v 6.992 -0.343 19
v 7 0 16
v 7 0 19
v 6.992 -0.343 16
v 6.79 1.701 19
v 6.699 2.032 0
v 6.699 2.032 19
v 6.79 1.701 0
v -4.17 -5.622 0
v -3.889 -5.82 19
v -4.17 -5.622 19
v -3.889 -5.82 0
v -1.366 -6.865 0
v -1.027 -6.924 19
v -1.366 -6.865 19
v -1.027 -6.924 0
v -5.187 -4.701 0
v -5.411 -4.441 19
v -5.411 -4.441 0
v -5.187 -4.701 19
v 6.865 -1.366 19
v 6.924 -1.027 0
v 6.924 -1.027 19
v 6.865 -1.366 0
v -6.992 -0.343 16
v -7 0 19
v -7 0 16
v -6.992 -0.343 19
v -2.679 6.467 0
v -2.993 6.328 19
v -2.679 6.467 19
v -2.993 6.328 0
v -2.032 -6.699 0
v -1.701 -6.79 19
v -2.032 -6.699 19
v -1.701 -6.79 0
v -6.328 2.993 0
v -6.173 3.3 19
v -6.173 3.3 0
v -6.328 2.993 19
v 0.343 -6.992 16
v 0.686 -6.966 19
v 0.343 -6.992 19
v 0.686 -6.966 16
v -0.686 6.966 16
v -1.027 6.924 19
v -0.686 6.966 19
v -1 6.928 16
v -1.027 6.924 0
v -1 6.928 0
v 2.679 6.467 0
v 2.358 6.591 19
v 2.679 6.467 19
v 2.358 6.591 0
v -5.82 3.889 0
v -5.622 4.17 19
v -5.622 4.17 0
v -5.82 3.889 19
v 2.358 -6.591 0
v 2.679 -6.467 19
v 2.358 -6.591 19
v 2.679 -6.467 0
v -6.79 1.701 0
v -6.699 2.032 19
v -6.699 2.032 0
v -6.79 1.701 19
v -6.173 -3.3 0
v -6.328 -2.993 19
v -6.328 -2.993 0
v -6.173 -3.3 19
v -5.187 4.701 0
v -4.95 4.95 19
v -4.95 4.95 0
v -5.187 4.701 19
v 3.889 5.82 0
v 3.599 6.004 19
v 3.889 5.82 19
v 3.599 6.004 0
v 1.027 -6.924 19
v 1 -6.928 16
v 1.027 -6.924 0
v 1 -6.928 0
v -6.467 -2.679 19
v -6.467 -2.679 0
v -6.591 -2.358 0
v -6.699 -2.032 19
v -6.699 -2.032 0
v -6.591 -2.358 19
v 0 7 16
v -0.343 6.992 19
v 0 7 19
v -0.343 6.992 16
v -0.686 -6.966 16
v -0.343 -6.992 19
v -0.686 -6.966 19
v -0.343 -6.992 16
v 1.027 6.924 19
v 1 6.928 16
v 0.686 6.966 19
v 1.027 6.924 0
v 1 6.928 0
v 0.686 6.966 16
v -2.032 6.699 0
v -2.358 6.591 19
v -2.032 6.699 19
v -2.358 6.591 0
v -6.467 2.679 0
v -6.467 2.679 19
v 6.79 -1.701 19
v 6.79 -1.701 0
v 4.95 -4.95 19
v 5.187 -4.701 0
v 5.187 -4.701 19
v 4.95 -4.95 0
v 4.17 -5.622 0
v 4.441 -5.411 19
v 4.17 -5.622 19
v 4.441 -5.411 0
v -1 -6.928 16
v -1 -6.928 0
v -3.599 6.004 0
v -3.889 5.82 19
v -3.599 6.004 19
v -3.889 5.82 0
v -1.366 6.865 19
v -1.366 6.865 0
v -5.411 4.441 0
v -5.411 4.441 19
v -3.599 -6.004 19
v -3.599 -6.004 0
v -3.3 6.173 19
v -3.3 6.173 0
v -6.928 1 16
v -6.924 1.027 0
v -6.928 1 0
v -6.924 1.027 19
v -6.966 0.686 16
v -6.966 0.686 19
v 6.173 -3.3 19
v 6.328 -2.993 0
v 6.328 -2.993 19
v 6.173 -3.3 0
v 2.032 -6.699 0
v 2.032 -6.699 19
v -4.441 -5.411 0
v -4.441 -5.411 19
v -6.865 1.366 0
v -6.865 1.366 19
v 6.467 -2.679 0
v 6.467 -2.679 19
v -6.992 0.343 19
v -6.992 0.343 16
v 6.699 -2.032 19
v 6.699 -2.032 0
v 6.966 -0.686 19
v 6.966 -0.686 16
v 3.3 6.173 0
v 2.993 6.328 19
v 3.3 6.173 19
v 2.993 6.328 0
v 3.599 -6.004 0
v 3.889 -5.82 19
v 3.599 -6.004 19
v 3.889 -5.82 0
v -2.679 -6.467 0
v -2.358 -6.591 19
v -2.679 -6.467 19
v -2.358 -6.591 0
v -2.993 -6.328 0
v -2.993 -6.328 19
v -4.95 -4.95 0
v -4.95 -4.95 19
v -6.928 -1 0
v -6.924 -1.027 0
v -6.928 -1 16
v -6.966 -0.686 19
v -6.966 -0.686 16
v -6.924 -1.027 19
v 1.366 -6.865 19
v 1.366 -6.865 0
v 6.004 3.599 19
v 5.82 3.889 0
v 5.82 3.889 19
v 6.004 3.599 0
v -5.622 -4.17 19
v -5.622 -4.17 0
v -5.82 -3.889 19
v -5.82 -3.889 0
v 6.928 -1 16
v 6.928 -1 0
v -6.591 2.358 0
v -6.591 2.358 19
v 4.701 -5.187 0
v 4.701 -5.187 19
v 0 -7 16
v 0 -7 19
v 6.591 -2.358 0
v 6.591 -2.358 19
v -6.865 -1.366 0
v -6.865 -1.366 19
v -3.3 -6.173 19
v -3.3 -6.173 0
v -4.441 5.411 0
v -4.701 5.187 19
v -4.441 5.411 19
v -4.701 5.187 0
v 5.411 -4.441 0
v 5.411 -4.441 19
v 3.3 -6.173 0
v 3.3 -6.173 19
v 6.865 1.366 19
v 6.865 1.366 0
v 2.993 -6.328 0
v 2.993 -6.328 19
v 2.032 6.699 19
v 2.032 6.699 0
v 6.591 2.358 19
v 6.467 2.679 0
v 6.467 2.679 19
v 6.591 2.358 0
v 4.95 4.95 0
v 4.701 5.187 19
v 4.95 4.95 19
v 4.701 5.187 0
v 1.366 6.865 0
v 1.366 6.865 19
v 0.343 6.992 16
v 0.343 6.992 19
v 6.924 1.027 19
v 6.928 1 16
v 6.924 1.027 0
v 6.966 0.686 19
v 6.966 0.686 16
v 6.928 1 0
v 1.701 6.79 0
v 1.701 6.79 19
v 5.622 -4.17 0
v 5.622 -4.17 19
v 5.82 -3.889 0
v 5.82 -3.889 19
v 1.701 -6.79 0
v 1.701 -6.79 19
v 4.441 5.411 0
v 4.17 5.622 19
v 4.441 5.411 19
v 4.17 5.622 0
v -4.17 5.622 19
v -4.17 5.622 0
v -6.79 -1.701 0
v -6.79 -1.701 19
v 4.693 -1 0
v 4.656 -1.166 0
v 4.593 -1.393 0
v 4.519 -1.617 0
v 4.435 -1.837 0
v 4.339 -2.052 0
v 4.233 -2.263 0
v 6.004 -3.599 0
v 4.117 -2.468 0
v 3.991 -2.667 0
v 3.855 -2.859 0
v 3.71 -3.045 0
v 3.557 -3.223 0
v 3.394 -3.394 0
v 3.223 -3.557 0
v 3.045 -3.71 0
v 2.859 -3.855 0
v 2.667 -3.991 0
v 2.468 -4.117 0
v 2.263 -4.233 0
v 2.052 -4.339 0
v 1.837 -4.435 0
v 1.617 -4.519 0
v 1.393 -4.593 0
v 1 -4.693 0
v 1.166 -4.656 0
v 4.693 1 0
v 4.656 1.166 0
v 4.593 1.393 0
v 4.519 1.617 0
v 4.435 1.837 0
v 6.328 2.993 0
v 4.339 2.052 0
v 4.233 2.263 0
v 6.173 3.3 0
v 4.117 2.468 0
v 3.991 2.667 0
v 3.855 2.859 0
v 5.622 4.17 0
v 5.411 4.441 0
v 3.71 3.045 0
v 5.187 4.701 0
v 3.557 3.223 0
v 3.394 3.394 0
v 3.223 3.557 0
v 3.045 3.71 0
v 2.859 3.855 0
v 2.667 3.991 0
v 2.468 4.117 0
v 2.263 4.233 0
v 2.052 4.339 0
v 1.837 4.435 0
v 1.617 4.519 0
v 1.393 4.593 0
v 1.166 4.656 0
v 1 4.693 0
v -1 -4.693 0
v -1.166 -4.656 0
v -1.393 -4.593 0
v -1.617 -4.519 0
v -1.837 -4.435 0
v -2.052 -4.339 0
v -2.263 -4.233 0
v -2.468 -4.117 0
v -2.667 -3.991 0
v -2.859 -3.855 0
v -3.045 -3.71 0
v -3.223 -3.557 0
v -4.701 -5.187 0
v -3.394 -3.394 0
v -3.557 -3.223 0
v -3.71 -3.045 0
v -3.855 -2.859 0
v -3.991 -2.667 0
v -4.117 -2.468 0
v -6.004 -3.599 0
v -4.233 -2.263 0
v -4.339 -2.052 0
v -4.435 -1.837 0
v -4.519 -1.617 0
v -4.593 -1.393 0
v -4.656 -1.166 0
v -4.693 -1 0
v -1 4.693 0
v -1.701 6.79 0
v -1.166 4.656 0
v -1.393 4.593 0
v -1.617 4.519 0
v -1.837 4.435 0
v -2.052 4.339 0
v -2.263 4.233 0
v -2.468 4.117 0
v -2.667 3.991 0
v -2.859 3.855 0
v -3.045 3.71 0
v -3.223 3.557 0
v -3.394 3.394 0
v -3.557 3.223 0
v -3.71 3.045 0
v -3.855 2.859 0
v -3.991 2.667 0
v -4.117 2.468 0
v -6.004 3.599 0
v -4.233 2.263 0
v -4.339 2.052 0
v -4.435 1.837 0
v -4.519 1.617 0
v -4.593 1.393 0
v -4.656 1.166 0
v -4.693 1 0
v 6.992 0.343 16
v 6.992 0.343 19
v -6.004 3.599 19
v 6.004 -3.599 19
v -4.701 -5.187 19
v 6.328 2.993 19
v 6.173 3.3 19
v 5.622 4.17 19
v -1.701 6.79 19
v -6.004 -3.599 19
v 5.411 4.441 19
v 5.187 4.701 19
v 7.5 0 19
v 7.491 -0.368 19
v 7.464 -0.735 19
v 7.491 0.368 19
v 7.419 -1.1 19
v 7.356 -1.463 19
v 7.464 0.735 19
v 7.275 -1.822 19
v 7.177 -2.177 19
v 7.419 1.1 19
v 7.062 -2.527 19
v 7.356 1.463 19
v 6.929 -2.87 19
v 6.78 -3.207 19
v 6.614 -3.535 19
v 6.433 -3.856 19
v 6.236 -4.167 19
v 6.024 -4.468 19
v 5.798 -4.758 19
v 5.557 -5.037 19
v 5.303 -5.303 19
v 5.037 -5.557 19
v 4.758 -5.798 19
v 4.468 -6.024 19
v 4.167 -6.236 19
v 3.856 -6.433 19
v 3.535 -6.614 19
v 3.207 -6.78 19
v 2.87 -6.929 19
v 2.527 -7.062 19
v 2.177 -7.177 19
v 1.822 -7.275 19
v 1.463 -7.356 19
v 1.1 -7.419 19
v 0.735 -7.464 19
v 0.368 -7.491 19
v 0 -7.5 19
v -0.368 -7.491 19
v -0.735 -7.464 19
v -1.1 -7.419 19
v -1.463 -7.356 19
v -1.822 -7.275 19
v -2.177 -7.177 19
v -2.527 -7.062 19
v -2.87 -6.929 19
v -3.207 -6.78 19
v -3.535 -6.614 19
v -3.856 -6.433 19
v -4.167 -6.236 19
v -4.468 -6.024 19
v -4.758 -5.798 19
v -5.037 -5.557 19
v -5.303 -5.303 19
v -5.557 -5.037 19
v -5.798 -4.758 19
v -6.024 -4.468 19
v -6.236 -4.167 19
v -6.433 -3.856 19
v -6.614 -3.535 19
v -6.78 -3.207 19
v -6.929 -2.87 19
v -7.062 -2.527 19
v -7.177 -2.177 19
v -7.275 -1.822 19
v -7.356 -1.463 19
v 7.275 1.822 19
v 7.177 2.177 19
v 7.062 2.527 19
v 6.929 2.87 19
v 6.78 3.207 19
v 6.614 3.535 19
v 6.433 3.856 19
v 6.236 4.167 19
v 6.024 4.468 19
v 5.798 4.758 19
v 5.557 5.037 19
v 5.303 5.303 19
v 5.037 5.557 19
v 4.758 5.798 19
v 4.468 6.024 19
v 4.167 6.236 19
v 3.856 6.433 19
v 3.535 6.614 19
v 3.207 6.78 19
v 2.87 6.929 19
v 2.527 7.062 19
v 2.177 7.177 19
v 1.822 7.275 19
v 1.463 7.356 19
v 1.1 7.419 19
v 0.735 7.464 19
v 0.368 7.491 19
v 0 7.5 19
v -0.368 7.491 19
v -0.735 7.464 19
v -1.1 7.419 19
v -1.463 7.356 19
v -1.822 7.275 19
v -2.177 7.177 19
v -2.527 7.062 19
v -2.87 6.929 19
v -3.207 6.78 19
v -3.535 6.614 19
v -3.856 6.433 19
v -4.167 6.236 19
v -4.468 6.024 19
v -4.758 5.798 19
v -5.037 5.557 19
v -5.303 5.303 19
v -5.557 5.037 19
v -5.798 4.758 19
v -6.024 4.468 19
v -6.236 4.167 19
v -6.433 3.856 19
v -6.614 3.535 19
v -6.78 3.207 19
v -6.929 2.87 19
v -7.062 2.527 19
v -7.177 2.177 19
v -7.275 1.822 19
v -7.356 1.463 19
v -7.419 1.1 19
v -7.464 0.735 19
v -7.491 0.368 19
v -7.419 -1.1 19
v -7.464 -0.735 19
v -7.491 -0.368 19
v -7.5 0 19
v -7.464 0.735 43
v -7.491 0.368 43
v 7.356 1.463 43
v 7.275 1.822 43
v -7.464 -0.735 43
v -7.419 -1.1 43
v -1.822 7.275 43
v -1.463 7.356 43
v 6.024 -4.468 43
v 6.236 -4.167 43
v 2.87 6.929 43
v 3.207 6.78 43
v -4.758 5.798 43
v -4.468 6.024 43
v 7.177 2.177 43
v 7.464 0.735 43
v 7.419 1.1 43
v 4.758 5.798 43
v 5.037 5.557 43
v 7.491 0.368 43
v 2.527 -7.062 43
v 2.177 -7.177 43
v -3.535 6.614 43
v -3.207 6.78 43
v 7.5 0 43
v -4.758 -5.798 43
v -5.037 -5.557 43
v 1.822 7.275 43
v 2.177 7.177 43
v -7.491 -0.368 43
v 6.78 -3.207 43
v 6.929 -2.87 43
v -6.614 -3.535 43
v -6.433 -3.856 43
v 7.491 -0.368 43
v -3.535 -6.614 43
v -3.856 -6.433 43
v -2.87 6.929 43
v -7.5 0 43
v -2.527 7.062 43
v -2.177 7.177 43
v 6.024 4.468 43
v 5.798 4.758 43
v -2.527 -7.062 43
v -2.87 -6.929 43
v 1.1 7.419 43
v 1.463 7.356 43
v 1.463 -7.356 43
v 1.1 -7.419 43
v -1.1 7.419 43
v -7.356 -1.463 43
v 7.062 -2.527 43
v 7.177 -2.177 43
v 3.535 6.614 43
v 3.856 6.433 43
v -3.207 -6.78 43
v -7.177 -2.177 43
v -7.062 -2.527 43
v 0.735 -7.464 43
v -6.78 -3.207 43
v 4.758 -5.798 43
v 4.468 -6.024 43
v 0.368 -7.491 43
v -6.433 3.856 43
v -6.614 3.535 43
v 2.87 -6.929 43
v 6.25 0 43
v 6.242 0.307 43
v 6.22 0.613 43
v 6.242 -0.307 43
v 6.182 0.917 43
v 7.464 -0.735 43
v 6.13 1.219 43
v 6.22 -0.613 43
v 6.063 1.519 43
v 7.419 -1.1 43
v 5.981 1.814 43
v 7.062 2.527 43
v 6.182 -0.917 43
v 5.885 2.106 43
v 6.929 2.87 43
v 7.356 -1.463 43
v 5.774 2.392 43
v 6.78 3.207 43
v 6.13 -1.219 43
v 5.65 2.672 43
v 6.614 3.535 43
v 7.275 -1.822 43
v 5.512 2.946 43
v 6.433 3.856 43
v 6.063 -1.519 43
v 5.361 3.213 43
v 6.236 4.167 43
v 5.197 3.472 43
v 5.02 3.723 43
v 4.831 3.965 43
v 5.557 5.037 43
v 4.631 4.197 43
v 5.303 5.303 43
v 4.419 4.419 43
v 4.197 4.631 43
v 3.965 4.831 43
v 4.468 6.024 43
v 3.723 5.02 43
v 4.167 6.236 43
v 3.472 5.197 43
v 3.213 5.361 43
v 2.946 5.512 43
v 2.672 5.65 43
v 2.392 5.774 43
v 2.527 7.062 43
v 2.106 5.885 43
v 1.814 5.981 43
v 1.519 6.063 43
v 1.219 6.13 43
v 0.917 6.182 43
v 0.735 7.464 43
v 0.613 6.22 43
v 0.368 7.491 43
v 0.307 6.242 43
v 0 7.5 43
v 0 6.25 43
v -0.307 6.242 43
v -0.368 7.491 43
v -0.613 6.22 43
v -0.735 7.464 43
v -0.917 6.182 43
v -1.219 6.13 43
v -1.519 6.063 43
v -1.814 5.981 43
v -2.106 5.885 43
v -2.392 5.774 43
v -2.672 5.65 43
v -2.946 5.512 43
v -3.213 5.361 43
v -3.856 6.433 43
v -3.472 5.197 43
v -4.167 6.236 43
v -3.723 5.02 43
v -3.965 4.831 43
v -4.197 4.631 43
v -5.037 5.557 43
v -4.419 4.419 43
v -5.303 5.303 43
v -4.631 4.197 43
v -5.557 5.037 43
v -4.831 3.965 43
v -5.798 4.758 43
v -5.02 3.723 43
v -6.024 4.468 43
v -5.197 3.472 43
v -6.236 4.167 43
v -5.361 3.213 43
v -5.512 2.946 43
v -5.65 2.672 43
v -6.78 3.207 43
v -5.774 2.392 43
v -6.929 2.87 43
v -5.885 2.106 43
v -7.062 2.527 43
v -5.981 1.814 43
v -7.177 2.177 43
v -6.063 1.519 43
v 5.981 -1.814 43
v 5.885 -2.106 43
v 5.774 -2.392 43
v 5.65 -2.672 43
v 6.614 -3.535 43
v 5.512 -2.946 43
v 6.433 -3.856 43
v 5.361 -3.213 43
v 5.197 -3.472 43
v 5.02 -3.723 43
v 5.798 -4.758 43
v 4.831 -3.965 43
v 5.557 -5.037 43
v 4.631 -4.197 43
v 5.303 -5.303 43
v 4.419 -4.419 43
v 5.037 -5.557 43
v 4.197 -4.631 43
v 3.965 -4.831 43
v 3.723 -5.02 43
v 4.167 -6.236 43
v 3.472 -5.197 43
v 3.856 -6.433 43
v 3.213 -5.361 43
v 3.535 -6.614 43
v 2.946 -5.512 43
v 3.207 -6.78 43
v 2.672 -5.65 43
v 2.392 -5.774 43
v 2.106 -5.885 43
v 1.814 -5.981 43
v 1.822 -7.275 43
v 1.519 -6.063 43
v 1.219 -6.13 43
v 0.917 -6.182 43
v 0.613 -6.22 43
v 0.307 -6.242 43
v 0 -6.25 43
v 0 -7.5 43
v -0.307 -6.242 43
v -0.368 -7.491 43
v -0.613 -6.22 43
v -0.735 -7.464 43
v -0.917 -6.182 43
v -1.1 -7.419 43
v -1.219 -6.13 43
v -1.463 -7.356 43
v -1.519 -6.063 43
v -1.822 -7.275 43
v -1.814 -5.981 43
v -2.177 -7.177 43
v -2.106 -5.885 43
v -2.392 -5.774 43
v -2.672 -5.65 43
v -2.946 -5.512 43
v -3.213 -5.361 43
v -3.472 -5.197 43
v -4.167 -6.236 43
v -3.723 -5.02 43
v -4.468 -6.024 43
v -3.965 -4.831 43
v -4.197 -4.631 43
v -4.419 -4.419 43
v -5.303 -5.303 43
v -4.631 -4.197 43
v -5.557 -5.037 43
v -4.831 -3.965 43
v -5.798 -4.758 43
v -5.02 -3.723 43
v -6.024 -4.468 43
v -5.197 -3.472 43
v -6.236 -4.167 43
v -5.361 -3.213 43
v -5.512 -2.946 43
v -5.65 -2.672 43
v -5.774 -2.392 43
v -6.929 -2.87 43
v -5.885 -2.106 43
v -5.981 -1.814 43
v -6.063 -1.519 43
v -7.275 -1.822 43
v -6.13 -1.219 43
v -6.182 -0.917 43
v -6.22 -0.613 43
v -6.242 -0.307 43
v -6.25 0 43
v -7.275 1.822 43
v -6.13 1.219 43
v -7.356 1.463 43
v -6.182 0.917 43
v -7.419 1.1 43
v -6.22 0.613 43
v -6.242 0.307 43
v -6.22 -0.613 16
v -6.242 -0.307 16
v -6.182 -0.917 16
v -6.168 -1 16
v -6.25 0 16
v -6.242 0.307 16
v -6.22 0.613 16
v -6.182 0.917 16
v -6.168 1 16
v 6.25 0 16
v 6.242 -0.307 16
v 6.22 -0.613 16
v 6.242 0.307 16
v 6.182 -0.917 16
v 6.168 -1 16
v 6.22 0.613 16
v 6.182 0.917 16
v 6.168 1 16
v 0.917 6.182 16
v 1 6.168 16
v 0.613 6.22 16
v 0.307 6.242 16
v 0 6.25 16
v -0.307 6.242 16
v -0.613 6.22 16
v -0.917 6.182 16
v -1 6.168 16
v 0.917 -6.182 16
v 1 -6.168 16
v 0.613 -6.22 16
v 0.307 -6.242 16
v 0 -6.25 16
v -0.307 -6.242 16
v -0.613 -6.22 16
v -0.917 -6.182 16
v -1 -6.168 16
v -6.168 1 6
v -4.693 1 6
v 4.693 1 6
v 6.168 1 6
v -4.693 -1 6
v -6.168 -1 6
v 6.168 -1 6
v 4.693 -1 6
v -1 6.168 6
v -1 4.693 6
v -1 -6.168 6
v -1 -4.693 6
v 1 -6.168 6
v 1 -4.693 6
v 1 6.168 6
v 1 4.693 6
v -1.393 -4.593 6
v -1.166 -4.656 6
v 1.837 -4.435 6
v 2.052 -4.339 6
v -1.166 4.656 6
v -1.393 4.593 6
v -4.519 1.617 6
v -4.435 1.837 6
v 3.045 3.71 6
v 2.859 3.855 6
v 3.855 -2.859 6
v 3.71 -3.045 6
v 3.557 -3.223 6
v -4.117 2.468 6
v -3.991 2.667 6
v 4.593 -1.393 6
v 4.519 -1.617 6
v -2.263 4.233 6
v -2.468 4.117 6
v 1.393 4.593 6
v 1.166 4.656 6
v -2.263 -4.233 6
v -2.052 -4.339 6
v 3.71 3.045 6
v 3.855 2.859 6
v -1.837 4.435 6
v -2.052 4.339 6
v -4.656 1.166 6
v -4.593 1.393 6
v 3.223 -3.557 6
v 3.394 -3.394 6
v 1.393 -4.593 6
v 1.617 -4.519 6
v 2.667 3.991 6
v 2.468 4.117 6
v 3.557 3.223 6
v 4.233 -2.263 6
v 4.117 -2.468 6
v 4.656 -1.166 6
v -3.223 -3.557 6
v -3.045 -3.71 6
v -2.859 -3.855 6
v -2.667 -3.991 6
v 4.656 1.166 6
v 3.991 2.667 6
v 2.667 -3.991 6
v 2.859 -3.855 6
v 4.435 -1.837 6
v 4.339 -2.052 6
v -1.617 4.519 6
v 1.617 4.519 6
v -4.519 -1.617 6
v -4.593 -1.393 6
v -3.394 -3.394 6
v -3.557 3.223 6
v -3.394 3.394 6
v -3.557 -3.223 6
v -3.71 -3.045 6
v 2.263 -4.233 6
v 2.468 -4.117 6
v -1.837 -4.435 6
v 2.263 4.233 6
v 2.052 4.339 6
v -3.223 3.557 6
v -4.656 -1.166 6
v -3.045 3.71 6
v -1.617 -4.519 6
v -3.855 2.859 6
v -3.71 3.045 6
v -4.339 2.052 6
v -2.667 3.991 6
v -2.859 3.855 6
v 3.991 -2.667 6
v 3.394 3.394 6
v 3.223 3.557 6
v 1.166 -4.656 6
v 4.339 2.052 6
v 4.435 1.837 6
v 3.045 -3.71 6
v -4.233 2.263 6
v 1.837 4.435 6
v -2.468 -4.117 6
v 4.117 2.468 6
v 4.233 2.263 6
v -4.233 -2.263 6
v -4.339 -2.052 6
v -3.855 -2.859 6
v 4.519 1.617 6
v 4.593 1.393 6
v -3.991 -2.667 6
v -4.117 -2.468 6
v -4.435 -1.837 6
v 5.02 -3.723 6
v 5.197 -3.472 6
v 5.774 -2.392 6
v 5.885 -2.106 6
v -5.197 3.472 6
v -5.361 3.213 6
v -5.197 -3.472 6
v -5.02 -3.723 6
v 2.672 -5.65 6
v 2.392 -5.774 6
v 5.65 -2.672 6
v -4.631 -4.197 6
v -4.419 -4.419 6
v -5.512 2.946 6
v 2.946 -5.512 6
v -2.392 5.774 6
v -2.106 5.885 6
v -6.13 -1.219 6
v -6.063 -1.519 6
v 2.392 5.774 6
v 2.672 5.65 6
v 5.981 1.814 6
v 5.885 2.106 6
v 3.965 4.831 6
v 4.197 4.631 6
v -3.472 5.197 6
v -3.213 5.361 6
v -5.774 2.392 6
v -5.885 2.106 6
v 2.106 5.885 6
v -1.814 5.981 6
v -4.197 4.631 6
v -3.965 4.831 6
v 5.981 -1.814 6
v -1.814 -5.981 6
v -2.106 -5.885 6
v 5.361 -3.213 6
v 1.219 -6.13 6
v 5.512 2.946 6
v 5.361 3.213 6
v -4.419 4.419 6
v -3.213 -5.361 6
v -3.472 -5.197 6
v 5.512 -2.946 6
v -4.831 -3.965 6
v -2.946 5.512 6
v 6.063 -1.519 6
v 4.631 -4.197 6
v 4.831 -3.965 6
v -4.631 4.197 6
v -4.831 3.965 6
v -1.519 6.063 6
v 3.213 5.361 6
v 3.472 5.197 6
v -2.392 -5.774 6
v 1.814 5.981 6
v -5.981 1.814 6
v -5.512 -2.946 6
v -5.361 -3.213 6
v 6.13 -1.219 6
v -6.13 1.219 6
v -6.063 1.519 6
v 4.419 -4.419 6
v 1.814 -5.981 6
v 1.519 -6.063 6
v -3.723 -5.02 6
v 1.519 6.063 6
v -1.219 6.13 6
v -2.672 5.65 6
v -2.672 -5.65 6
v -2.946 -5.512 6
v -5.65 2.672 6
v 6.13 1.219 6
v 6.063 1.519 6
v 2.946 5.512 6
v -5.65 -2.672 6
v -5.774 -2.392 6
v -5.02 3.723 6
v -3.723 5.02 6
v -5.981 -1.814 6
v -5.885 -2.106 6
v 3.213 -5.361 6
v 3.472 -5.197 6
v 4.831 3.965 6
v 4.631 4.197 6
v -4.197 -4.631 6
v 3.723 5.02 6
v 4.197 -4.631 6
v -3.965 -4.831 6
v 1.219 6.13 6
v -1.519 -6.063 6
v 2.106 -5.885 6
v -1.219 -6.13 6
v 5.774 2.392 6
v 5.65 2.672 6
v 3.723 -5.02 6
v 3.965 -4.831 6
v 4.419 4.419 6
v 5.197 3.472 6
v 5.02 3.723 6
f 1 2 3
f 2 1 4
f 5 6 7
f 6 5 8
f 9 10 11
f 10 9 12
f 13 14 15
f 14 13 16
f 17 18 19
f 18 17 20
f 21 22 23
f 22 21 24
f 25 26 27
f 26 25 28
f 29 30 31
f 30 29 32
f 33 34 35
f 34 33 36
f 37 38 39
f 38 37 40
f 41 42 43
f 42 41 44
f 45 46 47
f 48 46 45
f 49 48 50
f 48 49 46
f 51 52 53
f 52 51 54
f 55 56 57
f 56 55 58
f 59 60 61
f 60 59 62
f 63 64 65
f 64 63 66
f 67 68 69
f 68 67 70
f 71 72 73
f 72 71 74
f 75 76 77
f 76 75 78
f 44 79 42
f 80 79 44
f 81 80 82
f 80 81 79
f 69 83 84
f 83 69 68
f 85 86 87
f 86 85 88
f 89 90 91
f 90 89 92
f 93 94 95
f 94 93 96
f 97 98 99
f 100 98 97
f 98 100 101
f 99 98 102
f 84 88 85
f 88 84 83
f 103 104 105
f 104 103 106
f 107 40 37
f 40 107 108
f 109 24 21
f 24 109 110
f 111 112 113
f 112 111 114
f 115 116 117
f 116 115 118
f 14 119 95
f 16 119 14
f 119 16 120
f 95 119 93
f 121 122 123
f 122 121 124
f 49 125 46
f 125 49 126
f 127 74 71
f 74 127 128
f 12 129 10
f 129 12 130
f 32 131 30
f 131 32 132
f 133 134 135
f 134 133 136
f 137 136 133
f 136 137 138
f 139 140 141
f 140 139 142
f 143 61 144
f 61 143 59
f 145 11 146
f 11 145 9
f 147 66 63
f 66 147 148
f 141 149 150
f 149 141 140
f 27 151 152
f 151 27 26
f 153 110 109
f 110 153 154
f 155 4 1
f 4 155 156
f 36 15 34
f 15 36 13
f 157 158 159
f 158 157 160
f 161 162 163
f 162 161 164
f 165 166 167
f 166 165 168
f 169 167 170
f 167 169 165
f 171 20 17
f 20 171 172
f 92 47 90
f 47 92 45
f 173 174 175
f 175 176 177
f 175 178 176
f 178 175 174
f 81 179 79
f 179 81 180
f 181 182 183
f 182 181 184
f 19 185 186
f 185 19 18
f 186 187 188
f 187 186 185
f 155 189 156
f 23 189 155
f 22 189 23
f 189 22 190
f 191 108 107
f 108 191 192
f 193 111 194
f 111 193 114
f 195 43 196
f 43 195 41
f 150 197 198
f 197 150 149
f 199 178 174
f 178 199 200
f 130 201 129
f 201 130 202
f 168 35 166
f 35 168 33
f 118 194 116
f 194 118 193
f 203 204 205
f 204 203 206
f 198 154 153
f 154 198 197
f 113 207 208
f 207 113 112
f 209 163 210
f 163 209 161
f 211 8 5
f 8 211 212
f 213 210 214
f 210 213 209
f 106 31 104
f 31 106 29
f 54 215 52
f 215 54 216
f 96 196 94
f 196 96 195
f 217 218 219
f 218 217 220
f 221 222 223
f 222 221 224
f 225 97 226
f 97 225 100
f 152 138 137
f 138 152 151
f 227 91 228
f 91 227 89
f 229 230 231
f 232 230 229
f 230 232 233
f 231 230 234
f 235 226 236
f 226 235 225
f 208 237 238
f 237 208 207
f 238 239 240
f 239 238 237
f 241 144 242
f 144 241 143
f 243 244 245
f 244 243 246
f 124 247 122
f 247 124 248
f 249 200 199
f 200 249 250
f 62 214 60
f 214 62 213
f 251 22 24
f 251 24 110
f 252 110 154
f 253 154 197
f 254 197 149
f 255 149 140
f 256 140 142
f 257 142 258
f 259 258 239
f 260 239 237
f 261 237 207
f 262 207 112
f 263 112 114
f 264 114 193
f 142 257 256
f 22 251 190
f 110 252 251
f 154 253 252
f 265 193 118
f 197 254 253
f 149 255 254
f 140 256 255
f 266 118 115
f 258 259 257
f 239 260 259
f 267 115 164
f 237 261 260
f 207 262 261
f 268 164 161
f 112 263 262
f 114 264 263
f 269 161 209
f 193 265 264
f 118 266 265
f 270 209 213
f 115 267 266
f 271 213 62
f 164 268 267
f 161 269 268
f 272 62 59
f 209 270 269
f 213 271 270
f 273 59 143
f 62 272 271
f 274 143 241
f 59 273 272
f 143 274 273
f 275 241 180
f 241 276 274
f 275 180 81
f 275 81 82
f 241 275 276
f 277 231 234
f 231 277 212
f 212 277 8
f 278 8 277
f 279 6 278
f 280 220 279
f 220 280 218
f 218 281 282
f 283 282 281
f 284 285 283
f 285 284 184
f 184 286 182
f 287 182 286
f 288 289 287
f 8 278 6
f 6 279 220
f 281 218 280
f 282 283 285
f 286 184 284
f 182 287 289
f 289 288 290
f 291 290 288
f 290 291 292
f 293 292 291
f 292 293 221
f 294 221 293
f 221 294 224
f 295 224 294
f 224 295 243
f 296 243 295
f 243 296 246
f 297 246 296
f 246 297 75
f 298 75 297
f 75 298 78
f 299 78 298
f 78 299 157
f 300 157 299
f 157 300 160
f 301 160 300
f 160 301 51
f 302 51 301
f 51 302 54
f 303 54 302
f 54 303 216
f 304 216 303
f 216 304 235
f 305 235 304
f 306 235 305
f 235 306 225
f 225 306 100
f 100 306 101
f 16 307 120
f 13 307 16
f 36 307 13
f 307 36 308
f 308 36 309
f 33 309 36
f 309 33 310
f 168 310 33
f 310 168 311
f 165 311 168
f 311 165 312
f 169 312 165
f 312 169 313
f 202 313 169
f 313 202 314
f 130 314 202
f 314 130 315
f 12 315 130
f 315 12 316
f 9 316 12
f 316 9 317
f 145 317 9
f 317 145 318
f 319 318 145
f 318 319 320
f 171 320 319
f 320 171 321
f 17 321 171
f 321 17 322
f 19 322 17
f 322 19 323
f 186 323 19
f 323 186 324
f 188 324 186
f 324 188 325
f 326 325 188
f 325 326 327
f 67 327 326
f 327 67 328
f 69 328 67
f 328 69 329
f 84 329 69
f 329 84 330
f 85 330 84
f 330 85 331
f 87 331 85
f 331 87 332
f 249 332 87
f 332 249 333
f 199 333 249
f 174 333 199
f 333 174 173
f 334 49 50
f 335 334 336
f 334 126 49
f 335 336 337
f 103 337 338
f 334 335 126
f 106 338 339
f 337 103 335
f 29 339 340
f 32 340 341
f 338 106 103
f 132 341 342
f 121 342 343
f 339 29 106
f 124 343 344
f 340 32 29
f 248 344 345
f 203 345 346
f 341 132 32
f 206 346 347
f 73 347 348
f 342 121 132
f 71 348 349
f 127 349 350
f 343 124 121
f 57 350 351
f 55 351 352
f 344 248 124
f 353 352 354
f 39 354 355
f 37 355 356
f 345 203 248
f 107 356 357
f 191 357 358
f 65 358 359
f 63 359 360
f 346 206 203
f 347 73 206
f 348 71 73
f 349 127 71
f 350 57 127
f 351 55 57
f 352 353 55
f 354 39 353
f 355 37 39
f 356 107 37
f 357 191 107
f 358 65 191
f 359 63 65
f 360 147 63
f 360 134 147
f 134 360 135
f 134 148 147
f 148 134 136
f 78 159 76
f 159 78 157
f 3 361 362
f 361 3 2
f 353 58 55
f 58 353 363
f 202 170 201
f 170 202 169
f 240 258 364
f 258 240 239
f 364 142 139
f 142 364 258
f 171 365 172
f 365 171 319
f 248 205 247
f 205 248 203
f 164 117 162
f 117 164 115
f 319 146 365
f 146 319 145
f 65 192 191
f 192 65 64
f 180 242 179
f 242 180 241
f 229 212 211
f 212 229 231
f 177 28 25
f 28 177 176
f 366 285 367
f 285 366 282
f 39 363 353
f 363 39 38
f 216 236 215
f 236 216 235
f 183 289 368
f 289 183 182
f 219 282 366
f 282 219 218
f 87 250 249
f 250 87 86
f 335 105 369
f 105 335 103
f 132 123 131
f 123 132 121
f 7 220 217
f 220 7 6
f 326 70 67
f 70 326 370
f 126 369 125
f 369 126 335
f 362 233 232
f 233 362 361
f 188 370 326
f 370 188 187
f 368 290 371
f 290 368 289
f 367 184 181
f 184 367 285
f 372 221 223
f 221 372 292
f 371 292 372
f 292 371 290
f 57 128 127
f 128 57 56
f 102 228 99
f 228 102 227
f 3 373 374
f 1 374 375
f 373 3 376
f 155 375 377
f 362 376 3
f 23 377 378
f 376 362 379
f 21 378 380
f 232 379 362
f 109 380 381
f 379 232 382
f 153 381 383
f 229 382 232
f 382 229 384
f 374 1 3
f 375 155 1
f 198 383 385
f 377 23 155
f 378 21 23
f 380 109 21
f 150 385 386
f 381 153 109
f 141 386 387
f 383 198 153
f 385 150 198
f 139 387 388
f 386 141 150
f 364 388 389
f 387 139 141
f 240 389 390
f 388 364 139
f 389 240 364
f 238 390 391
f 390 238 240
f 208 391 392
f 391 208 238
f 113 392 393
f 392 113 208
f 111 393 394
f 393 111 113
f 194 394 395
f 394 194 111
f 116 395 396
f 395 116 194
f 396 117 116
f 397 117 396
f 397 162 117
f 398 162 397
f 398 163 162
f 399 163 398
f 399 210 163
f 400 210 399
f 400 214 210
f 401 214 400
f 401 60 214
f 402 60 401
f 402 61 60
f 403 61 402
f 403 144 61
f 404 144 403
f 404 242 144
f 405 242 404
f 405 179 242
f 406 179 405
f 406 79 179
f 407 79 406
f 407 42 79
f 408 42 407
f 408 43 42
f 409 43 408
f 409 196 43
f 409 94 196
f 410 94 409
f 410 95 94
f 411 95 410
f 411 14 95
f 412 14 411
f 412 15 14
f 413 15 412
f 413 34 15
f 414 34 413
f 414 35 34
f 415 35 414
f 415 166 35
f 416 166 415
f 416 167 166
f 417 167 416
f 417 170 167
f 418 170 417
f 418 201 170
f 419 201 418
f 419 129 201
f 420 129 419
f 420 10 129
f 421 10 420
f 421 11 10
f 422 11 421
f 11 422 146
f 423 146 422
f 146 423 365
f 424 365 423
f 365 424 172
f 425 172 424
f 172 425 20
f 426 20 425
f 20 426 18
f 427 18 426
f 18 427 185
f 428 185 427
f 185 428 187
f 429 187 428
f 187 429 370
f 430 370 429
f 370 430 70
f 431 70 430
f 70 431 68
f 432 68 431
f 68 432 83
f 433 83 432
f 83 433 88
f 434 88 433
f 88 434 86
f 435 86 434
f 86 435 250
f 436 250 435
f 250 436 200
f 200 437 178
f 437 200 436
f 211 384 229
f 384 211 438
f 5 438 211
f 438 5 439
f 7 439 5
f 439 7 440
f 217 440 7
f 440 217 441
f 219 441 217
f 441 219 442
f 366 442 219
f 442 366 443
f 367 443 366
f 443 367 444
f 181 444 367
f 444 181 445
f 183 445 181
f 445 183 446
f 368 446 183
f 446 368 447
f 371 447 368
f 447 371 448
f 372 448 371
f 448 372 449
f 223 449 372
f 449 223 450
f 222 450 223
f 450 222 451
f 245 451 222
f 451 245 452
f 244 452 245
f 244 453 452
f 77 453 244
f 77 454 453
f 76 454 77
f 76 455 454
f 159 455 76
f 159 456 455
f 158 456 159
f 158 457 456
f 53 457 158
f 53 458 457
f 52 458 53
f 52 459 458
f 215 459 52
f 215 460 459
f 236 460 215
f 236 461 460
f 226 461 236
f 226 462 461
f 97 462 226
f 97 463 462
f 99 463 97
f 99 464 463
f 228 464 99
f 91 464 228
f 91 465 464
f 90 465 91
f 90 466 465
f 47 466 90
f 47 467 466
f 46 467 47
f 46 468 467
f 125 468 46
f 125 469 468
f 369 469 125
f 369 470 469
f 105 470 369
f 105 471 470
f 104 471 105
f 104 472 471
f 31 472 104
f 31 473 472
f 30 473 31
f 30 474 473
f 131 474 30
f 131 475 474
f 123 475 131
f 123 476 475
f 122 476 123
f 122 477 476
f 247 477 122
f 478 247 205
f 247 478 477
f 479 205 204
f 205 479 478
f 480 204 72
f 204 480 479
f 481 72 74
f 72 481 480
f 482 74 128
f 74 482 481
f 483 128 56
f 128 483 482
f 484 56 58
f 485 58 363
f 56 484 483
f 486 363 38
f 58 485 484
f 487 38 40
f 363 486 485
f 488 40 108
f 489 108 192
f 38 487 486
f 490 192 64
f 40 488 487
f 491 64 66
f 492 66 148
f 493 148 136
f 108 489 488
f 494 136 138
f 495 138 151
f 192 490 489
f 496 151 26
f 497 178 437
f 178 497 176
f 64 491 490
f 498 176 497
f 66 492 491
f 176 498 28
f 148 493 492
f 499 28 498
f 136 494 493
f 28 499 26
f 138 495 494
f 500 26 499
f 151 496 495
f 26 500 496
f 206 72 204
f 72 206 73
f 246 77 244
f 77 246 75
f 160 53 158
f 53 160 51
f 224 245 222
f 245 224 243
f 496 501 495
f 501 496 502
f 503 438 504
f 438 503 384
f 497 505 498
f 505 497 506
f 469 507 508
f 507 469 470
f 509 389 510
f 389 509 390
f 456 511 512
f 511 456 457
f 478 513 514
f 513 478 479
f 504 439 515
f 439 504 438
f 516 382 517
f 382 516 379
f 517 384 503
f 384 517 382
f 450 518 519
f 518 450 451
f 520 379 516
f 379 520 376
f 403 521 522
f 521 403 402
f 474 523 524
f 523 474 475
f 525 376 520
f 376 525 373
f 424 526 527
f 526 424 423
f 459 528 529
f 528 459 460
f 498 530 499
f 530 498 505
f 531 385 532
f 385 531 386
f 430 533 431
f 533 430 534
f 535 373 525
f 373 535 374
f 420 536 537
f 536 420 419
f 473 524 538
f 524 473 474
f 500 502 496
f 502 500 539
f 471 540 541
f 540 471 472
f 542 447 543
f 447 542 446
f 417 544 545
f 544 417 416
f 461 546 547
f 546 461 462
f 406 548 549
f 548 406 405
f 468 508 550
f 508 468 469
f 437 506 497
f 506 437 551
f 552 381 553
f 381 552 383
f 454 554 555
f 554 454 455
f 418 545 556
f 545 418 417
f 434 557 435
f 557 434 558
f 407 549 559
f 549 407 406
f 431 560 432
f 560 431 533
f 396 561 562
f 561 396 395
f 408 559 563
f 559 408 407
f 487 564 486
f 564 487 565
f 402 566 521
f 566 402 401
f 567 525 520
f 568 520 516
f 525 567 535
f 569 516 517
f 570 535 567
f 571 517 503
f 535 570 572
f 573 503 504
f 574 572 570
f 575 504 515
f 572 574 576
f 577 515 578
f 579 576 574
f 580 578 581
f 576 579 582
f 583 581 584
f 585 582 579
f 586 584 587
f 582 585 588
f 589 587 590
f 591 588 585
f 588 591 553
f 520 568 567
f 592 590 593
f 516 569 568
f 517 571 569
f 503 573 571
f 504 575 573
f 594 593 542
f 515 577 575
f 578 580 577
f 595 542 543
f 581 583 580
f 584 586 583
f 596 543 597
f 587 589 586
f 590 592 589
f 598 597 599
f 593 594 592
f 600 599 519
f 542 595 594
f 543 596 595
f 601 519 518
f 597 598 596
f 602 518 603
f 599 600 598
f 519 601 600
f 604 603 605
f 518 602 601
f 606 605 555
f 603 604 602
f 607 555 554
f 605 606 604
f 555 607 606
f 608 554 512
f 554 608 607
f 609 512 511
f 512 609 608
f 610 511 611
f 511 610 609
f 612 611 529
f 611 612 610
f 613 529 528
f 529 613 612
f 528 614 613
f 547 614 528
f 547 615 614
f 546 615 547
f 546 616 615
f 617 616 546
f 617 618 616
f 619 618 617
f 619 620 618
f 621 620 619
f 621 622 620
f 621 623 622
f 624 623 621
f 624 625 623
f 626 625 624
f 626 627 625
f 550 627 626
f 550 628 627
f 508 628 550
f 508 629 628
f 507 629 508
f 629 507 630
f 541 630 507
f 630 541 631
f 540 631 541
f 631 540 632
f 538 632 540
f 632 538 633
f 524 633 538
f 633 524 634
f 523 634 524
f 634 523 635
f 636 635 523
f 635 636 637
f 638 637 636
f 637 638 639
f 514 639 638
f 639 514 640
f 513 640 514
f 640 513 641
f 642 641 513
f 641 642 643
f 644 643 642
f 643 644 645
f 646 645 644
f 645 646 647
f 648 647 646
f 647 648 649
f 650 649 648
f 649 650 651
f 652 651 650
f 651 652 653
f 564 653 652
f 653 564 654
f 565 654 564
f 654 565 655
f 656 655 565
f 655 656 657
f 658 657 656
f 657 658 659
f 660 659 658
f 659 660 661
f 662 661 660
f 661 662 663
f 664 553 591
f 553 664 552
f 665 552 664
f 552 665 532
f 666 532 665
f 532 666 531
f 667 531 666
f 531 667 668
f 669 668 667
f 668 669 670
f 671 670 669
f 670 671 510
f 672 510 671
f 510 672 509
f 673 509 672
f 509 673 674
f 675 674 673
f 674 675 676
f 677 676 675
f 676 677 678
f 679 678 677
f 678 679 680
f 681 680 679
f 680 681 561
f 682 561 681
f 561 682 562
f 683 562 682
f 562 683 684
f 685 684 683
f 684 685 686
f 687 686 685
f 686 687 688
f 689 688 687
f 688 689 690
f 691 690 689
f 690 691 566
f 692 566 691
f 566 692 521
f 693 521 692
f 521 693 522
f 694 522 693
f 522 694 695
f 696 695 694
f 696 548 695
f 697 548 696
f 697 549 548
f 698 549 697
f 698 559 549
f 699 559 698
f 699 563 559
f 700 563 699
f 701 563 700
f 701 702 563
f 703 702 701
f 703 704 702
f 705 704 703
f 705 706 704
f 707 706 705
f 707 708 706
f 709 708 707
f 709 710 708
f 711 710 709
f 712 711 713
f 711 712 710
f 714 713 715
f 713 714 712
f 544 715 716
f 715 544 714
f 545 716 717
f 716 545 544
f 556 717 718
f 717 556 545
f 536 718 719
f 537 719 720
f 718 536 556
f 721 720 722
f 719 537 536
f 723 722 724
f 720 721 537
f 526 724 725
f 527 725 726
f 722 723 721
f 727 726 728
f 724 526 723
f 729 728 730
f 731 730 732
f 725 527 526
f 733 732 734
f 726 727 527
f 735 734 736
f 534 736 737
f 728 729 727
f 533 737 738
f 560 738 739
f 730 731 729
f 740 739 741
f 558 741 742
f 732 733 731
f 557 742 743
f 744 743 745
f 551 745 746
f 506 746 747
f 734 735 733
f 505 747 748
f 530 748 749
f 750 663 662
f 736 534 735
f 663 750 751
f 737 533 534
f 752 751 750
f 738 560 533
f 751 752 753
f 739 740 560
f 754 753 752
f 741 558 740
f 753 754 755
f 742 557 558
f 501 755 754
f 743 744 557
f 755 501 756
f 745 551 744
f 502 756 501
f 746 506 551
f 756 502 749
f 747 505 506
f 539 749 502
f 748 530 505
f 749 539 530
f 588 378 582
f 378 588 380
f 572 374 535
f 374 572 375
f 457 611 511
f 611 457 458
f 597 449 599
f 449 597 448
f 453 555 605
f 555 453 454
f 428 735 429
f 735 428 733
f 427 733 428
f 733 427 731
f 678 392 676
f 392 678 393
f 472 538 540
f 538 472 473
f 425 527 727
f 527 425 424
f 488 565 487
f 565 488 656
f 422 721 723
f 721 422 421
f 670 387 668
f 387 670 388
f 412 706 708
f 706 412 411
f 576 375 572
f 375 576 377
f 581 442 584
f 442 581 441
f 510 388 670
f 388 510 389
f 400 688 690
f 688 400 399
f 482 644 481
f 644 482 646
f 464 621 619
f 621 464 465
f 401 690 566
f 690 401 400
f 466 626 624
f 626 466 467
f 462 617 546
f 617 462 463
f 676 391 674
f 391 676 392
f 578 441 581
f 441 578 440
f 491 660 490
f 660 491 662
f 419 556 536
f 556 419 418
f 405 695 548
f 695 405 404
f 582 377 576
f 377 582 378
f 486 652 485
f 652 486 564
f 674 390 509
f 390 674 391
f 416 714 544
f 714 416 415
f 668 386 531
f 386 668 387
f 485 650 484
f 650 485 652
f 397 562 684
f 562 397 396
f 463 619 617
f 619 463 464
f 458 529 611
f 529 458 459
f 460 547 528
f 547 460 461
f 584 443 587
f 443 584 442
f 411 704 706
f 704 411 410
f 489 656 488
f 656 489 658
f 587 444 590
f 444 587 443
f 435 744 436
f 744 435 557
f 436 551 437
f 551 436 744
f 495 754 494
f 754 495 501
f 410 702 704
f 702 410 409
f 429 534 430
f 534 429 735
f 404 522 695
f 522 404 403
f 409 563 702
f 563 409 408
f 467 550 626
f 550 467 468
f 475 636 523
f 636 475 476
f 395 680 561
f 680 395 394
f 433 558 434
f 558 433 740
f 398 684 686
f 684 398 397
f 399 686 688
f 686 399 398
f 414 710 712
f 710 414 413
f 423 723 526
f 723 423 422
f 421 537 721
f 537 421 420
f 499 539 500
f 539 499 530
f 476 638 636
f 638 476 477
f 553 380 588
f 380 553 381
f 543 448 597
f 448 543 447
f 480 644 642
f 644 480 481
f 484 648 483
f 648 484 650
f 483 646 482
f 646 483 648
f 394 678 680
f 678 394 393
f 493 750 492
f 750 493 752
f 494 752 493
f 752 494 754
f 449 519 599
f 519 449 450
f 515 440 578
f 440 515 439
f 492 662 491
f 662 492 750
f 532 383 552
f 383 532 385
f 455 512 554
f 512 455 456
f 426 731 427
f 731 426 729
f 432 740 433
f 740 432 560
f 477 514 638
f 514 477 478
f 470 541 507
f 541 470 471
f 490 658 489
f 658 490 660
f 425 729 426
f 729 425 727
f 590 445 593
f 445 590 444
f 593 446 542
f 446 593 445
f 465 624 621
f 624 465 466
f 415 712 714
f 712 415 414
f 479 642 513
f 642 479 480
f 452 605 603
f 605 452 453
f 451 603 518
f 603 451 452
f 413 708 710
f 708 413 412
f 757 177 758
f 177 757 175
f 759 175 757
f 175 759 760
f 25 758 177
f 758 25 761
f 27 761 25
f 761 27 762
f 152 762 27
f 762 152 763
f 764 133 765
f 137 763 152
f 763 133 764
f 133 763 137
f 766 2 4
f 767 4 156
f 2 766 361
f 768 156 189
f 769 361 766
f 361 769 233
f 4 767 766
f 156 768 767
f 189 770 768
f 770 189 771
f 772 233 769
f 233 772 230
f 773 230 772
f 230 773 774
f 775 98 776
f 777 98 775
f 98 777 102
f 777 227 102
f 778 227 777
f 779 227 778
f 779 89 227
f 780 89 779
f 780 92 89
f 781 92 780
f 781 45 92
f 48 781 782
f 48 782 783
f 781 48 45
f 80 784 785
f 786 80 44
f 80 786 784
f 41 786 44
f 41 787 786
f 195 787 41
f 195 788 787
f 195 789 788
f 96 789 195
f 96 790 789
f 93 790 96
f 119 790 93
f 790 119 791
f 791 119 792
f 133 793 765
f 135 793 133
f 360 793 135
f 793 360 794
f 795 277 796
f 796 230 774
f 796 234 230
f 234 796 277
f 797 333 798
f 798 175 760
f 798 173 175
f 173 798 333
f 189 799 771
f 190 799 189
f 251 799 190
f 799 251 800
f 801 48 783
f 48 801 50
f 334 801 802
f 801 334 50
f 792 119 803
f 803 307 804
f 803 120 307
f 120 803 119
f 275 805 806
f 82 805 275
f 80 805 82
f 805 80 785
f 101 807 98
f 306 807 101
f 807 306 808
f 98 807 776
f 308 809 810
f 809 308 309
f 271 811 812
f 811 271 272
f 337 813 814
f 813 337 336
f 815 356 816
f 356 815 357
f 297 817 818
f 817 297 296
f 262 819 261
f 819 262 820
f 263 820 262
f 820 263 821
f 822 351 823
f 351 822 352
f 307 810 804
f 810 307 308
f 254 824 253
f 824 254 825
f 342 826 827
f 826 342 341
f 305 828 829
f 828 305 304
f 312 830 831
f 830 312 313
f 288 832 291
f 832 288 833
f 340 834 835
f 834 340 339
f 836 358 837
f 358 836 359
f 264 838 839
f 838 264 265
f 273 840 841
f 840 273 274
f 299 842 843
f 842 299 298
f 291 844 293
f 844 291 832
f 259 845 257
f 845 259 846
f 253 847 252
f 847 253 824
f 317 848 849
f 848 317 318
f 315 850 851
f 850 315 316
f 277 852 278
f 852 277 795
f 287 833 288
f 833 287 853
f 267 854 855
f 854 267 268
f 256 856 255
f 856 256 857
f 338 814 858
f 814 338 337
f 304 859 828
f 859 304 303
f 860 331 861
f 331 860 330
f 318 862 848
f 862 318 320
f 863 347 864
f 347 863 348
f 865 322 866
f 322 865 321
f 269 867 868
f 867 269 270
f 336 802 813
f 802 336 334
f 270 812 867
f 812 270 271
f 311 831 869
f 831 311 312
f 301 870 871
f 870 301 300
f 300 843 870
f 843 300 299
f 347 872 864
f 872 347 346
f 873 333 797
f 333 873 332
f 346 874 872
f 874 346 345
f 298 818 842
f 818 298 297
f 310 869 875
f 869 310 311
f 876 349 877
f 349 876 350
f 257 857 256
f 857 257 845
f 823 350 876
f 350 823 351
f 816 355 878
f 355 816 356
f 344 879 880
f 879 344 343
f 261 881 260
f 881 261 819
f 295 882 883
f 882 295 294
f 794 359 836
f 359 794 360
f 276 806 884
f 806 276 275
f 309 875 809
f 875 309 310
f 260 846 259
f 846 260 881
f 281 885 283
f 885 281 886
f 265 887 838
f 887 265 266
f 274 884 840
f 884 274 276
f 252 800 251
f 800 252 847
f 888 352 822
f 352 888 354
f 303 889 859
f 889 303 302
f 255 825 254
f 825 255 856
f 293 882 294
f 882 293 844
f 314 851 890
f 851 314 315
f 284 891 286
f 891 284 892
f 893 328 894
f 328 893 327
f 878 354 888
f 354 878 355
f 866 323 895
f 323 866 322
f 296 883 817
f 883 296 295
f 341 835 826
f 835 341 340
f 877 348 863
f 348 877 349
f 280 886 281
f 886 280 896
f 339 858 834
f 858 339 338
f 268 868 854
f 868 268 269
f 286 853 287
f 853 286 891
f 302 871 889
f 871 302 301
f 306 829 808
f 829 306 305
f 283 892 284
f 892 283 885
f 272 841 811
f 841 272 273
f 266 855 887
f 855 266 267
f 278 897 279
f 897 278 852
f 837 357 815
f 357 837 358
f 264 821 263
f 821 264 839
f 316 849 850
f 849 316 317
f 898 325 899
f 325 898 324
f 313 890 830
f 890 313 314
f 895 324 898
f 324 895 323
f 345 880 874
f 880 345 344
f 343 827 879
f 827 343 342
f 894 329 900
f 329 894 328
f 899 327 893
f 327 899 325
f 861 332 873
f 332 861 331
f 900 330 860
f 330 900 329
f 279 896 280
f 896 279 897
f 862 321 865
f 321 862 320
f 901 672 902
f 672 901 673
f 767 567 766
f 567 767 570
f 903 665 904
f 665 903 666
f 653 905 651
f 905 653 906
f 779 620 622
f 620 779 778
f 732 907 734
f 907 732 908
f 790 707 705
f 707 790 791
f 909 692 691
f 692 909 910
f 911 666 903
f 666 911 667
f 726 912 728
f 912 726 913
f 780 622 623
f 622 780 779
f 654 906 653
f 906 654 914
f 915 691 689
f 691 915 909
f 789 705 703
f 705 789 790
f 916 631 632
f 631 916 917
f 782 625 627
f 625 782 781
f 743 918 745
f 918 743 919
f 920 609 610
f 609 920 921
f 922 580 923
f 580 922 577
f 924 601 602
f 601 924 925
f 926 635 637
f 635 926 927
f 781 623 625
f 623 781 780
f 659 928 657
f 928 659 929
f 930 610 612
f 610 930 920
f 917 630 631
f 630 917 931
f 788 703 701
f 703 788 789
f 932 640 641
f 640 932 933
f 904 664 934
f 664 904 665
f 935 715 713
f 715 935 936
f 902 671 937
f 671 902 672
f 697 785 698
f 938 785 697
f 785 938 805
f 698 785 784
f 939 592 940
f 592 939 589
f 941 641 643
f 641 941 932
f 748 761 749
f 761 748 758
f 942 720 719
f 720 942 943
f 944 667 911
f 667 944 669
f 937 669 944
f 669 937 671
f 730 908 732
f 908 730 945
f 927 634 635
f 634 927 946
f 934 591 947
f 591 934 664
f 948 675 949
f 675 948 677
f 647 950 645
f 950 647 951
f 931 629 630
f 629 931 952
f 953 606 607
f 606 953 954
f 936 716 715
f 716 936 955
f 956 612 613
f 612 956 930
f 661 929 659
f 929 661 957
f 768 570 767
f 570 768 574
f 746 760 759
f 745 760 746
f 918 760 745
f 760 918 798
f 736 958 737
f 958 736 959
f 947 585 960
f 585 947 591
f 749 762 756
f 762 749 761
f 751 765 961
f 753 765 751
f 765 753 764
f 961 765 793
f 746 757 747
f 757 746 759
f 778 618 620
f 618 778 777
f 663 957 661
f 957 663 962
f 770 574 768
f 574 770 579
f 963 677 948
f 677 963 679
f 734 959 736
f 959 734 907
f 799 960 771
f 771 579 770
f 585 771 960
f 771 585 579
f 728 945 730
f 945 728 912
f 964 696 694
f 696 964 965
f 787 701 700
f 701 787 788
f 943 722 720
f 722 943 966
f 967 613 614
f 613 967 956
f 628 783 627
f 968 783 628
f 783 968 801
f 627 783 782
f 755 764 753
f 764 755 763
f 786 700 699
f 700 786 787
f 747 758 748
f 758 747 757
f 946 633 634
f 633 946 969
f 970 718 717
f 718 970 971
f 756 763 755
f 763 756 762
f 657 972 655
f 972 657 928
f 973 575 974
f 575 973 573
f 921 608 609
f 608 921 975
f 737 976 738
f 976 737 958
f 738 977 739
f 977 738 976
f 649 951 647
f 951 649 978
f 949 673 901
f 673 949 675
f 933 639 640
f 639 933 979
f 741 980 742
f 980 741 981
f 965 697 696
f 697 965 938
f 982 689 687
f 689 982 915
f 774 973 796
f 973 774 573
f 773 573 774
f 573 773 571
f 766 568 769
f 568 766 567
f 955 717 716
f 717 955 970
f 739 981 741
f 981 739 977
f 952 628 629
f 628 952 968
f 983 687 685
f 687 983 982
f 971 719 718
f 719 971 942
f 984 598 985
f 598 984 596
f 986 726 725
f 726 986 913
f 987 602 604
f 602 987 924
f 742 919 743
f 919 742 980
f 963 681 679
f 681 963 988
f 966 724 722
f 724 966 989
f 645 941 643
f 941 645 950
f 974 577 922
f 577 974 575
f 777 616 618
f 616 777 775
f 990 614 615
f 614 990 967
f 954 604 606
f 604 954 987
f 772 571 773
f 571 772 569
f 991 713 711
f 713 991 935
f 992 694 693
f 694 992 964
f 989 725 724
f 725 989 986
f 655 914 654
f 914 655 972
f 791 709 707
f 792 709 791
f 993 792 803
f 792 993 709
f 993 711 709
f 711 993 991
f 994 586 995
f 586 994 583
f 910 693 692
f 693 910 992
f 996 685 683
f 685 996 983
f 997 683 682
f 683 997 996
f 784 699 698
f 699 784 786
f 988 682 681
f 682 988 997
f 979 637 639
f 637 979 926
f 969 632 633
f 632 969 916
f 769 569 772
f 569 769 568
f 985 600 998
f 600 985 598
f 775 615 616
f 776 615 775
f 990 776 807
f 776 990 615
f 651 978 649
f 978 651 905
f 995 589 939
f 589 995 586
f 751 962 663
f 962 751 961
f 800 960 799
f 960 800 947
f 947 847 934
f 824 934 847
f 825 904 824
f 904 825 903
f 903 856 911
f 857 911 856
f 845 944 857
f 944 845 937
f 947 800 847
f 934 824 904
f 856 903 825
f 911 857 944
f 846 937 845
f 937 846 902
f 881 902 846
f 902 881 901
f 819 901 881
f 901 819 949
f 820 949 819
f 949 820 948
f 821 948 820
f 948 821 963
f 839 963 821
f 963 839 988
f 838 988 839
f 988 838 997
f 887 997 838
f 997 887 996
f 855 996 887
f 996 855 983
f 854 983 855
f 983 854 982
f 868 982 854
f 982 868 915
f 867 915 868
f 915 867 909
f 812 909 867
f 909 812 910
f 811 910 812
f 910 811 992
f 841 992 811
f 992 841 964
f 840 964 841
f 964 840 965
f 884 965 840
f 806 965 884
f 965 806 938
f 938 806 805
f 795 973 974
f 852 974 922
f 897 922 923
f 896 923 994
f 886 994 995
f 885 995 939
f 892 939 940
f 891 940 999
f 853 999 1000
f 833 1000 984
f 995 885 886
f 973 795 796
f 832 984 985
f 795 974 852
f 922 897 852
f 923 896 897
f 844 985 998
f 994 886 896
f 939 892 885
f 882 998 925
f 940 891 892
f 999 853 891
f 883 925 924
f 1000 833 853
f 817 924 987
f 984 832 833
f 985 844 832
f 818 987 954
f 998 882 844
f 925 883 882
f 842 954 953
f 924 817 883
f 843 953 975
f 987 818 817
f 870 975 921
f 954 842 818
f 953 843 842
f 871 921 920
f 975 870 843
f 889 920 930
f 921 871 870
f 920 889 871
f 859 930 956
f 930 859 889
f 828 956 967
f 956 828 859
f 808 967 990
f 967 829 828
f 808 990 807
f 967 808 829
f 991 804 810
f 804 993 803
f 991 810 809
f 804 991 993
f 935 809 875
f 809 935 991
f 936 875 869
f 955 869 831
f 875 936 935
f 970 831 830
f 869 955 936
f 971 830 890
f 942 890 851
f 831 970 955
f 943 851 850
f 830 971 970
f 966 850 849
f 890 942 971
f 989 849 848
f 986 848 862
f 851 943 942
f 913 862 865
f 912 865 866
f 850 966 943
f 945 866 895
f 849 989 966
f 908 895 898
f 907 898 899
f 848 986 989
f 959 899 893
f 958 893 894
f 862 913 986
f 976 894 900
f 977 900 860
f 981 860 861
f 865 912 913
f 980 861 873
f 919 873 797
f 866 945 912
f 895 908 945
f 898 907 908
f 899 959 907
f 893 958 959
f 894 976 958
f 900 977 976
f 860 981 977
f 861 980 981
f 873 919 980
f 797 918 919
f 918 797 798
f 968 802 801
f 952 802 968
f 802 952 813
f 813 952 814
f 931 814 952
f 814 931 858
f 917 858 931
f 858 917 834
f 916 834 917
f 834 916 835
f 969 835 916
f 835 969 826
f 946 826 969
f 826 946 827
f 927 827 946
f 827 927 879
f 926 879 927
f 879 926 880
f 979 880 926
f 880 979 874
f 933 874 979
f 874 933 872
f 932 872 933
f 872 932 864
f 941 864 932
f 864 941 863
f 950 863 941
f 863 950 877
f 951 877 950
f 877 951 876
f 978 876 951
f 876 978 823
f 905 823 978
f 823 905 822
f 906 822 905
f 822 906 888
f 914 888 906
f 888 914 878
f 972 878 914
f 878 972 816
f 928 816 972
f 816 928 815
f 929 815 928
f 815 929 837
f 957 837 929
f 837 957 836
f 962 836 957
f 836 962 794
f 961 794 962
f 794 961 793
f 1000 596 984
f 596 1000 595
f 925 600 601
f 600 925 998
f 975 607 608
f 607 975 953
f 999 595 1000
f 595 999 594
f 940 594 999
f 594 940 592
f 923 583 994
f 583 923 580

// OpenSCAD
topDiameter = 15;
bottomDiameter = 14;

topHeight = 24;
totalHeight = 43;
bottomHeight = totalHeight - topHeight;

penTopDiameter = 12.5;
penBottomDiameter = 9.6;
penBottomHeight = 6;

bendSpace = 2;
bendMargin = 3;

$fn = $preview ? 32 : 128;

module adapter() {
    difference() {
        outerShape();
        
        bendCut();
        
        rotate([0, 0, 90])
        bendCut();
        
        translate([0, 0, -0.01])
        linear_extrude(2 * totalHeight)
        circle(d = penBottomDiameter);
        
        translate([0, 0, penBottomHeight])
        linear_extrude(2 * totalHeight)
        circle(d = penTopDiameter);
    }
}

module outerShape() {
    linear_extrude(bottomHeight)
    circle(d = bottomDiameter);

    translate([0, 0, bottomHeight])
    linear_extrude(topHeight)
    circle(d = topDiameter);
}

module bendCut() {
    translate([-topDiameter, -bendSpace / 2, -bendMargin])
    cube([2* topDiameter, bendSpace, bottomHeight]);
}

adapter();
